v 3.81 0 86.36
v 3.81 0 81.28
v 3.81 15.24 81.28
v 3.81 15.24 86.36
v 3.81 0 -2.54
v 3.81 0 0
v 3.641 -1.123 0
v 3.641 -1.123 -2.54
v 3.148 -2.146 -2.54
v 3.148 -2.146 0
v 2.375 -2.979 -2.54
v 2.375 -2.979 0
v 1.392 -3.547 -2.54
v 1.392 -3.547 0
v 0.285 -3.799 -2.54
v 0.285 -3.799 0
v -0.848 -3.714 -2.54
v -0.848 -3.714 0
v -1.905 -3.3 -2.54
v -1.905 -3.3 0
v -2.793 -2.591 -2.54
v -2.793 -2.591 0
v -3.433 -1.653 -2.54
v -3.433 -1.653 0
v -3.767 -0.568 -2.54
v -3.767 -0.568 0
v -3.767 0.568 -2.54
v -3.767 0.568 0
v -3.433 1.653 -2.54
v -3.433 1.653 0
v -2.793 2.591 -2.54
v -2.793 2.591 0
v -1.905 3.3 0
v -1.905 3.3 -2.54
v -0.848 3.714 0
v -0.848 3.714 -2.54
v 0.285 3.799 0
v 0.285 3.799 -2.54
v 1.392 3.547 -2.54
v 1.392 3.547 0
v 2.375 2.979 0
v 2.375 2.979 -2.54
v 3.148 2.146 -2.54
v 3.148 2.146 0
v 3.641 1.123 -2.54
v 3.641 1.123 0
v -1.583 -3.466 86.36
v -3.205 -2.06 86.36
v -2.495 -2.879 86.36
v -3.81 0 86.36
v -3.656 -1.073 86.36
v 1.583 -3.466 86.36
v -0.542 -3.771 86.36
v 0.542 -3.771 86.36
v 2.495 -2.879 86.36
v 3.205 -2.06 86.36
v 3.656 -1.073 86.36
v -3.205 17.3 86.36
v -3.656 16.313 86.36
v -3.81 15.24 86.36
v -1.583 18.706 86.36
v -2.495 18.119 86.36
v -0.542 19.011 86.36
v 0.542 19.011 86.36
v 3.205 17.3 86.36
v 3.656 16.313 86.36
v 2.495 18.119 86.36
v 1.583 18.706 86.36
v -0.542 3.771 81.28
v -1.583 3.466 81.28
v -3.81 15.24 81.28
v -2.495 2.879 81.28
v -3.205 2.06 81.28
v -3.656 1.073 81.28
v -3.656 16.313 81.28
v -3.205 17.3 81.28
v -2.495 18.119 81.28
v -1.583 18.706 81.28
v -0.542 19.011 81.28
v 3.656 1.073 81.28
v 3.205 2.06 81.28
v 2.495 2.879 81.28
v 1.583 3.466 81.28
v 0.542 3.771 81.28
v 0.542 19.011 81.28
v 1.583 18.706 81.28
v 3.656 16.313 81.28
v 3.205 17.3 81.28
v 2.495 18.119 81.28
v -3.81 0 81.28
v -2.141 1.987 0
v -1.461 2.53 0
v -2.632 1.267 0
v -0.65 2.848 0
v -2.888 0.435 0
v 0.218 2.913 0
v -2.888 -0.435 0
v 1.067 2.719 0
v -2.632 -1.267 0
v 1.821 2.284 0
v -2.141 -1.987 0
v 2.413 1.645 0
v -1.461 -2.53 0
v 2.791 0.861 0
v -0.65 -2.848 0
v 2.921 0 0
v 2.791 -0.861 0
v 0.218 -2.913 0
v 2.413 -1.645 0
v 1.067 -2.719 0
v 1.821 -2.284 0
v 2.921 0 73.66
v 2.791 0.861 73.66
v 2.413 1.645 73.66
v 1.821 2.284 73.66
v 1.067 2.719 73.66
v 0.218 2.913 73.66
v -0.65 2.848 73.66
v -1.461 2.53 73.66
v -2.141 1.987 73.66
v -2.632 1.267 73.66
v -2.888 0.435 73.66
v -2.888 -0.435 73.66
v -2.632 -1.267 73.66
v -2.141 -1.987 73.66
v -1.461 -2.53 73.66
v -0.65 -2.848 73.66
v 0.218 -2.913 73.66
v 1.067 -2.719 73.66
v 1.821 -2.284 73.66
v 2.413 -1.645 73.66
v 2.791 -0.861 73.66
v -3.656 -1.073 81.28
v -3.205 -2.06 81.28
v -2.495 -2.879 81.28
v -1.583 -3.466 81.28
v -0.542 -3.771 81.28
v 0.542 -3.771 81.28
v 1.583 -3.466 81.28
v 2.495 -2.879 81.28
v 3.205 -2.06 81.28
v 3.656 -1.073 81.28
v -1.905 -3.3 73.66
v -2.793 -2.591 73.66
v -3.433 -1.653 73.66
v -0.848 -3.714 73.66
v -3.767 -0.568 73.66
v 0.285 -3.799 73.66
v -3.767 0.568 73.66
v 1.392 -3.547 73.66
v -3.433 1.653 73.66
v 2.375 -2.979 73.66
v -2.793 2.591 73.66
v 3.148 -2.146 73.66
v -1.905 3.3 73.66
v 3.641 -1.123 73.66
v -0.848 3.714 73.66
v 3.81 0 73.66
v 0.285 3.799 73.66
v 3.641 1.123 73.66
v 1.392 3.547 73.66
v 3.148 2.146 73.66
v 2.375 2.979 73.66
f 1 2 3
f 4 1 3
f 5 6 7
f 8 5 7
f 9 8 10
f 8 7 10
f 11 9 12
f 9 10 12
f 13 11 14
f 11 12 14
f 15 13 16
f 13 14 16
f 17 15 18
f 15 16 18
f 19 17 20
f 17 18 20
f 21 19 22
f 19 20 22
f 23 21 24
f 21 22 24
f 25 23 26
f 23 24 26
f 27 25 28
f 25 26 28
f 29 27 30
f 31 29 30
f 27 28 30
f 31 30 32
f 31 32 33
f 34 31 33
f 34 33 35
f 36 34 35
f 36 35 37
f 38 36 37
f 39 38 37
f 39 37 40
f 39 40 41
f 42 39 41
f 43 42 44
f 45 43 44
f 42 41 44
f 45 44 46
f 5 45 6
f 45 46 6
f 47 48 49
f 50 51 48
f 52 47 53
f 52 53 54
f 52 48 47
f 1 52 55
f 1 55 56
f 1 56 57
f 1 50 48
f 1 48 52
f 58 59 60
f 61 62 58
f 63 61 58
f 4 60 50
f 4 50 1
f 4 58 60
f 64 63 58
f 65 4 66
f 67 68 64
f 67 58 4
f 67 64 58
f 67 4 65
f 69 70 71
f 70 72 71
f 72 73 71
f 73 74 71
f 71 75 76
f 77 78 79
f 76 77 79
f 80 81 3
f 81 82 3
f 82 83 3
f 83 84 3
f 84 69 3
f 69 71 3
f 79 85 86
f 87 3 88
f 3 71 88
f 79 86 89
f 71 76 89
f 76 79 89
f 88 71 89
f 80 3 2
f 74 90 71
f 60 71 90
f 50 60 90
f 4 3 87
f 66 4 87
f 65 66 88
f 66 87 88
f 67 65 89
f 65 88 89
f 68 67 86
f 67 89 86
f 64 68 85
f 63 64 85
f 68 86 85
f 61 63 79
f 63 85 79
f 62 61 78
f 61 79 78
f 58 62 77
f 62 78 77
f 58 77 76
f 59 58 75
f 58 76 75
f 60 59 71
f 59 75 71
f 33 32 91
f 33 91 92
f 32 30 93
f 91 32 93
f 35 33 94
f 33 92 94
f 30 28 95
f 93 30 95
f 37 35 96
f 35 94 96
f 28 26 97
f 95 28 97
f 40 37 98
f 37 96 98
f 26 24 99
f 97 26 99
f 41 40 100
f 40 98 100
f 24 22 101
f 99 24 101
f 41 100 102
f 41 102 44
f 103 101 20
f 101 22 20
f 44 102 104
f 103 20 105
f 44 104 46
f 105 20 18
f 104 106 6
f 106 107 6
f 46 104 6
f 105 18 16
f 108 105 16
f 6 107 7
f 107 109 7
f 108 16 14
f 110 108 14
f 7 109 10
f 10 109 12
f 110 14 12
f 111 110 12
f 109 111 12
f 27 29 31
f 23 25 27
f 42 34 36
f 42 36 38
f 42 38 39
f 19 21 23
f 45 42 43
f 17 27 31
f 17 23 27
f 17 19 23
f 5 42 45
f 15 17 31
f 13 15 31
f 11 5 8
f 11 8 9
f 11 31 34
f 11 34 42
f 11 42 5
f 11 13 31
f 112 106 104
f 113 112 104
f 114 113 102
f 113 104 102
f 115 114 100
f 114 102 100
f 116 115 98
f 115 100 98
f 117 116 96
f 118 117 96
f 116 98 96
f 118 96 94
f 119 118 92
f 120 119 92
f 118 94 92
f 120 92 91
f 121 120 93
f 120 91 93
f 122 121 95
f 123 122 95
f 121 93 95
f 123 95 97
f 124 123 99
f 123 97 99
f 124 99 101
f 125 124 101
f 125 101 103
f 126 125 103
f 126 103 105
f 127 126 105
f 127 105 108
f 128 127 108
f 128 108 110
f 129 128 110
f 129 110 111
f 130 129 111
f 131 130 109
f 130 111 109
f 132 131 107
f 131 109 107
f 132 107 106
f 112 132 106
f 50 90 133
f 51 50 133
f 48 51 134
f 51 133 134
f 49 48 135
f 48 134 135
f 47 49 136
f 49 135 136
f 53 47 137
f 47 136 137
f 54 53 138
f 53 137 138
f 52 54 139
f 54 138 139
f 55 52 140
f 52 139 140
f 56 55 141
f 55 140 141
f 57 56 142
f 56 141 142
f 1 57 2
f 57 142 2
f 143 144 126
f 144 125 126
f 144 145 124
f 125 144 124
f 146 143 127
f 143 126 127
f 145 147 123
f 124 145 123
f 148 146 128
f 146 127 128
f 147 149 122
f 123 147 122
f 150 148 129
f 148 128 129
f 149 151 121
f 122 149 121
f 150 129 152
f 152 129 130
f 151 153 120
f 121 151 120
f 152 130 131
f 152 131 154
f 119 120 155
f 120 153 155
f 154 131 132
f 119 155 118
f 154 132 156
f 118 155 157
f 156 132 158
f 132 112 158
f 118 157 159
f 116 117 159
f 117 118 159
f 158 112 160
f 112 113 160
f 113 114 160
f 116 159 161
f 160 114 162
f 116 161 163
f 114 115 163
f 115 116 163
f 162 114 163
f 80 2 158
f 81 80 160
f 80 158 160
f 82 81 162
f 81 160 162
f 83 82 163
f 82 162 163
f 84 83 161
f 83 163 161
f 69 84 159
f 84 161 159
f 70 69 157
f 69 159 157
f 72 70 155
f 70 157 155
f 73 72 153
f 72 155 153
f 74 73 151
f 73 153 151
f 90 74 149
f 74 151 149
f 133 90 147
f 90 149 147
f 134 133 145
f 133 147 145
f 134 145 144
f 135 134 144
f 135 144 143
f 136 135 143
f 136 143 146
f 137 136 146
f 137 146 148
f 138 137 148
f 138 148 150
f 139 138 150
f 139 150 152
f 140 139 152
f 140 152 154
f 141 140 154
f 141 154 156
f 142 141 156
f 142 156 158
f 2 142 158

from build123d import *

# Parameters (mm, degrees)
F0_R     = 2.921
F1_DEPTH = 73.66
F2_R     = 3.81
F2_R_2   = 2.921
F3_DEPTH = 2.54
F4_R     = 3.81
F5_DEPTH = 7.62
F7_DEPTH = 5.08


with BuildPart() as f1:
    # F0 (on Top) → F1 (new body)
    with BuildSketch(Plane.XY):
        Circle(F0_R)
    extrude(amount=F1_DEPTH)

    # F2 (on face) → F3 (join)
    with BuildSketch(Plane(origin=(0, 0, 0), x_dir=(1, 0, 0), z_dir=(0, 0, -1))):
        Circle(F2_R)
        Circle(F2_R_2, mode=Mode.SUBTRACT)
        Circle(F2_R_2)
    extrude(amount=F3_DEPTH)

    # F4 (on face) → F5 (join)
    with BuildSketch(Plane.XY.offset(73.66)):
        Circle(F4_R)
    extrude(amount=F5_DEPTH)

    # F6 (on face) → F7 (join)
    with BuildSketch(Plane.XY.offset(81.28)):
        with BuildLine():
            ThreePointArc((-3.81, 0), (0, 3.81), (3.81, 0))
            Line((3.81, 0), (3.81, 15.24))
            ThreePointArc((3.81, 15.24), (0, 11.43), (-3.81, 15.24))
            Line((-3.81, 15.24), (-3.81, 0))
        make_face()
        with BuildLine():
            Line((-3.81, 0), (3.81, 0))
            ThreePointArc((3.81, 0), (0, 3.81), (-3.81, 0))
        make_face()
        with BuildLine():
            ThreePointArc((-3.81, 0), (0, -3.81), (3.81, 0))
            Line((3.81, 0), (-3.81, 0))
        make_face()
        with BuildLine():
            Line((-3.81, 15.24), (3.81, 15.24))
            ThreePointArc((3.81, 15.24), (0, 19.05), (-3.81, 15.24))
        make_face()
        with BuildLine():
            ThreePointArc((-3.81, 15.24), (0, 11.43), (3.81, 15.24))
            Line((3.81, 15.24), (-3.81, 15.24))
        make_face()
    extrude(amount=F7_DEPTH)


solid = f1.part
